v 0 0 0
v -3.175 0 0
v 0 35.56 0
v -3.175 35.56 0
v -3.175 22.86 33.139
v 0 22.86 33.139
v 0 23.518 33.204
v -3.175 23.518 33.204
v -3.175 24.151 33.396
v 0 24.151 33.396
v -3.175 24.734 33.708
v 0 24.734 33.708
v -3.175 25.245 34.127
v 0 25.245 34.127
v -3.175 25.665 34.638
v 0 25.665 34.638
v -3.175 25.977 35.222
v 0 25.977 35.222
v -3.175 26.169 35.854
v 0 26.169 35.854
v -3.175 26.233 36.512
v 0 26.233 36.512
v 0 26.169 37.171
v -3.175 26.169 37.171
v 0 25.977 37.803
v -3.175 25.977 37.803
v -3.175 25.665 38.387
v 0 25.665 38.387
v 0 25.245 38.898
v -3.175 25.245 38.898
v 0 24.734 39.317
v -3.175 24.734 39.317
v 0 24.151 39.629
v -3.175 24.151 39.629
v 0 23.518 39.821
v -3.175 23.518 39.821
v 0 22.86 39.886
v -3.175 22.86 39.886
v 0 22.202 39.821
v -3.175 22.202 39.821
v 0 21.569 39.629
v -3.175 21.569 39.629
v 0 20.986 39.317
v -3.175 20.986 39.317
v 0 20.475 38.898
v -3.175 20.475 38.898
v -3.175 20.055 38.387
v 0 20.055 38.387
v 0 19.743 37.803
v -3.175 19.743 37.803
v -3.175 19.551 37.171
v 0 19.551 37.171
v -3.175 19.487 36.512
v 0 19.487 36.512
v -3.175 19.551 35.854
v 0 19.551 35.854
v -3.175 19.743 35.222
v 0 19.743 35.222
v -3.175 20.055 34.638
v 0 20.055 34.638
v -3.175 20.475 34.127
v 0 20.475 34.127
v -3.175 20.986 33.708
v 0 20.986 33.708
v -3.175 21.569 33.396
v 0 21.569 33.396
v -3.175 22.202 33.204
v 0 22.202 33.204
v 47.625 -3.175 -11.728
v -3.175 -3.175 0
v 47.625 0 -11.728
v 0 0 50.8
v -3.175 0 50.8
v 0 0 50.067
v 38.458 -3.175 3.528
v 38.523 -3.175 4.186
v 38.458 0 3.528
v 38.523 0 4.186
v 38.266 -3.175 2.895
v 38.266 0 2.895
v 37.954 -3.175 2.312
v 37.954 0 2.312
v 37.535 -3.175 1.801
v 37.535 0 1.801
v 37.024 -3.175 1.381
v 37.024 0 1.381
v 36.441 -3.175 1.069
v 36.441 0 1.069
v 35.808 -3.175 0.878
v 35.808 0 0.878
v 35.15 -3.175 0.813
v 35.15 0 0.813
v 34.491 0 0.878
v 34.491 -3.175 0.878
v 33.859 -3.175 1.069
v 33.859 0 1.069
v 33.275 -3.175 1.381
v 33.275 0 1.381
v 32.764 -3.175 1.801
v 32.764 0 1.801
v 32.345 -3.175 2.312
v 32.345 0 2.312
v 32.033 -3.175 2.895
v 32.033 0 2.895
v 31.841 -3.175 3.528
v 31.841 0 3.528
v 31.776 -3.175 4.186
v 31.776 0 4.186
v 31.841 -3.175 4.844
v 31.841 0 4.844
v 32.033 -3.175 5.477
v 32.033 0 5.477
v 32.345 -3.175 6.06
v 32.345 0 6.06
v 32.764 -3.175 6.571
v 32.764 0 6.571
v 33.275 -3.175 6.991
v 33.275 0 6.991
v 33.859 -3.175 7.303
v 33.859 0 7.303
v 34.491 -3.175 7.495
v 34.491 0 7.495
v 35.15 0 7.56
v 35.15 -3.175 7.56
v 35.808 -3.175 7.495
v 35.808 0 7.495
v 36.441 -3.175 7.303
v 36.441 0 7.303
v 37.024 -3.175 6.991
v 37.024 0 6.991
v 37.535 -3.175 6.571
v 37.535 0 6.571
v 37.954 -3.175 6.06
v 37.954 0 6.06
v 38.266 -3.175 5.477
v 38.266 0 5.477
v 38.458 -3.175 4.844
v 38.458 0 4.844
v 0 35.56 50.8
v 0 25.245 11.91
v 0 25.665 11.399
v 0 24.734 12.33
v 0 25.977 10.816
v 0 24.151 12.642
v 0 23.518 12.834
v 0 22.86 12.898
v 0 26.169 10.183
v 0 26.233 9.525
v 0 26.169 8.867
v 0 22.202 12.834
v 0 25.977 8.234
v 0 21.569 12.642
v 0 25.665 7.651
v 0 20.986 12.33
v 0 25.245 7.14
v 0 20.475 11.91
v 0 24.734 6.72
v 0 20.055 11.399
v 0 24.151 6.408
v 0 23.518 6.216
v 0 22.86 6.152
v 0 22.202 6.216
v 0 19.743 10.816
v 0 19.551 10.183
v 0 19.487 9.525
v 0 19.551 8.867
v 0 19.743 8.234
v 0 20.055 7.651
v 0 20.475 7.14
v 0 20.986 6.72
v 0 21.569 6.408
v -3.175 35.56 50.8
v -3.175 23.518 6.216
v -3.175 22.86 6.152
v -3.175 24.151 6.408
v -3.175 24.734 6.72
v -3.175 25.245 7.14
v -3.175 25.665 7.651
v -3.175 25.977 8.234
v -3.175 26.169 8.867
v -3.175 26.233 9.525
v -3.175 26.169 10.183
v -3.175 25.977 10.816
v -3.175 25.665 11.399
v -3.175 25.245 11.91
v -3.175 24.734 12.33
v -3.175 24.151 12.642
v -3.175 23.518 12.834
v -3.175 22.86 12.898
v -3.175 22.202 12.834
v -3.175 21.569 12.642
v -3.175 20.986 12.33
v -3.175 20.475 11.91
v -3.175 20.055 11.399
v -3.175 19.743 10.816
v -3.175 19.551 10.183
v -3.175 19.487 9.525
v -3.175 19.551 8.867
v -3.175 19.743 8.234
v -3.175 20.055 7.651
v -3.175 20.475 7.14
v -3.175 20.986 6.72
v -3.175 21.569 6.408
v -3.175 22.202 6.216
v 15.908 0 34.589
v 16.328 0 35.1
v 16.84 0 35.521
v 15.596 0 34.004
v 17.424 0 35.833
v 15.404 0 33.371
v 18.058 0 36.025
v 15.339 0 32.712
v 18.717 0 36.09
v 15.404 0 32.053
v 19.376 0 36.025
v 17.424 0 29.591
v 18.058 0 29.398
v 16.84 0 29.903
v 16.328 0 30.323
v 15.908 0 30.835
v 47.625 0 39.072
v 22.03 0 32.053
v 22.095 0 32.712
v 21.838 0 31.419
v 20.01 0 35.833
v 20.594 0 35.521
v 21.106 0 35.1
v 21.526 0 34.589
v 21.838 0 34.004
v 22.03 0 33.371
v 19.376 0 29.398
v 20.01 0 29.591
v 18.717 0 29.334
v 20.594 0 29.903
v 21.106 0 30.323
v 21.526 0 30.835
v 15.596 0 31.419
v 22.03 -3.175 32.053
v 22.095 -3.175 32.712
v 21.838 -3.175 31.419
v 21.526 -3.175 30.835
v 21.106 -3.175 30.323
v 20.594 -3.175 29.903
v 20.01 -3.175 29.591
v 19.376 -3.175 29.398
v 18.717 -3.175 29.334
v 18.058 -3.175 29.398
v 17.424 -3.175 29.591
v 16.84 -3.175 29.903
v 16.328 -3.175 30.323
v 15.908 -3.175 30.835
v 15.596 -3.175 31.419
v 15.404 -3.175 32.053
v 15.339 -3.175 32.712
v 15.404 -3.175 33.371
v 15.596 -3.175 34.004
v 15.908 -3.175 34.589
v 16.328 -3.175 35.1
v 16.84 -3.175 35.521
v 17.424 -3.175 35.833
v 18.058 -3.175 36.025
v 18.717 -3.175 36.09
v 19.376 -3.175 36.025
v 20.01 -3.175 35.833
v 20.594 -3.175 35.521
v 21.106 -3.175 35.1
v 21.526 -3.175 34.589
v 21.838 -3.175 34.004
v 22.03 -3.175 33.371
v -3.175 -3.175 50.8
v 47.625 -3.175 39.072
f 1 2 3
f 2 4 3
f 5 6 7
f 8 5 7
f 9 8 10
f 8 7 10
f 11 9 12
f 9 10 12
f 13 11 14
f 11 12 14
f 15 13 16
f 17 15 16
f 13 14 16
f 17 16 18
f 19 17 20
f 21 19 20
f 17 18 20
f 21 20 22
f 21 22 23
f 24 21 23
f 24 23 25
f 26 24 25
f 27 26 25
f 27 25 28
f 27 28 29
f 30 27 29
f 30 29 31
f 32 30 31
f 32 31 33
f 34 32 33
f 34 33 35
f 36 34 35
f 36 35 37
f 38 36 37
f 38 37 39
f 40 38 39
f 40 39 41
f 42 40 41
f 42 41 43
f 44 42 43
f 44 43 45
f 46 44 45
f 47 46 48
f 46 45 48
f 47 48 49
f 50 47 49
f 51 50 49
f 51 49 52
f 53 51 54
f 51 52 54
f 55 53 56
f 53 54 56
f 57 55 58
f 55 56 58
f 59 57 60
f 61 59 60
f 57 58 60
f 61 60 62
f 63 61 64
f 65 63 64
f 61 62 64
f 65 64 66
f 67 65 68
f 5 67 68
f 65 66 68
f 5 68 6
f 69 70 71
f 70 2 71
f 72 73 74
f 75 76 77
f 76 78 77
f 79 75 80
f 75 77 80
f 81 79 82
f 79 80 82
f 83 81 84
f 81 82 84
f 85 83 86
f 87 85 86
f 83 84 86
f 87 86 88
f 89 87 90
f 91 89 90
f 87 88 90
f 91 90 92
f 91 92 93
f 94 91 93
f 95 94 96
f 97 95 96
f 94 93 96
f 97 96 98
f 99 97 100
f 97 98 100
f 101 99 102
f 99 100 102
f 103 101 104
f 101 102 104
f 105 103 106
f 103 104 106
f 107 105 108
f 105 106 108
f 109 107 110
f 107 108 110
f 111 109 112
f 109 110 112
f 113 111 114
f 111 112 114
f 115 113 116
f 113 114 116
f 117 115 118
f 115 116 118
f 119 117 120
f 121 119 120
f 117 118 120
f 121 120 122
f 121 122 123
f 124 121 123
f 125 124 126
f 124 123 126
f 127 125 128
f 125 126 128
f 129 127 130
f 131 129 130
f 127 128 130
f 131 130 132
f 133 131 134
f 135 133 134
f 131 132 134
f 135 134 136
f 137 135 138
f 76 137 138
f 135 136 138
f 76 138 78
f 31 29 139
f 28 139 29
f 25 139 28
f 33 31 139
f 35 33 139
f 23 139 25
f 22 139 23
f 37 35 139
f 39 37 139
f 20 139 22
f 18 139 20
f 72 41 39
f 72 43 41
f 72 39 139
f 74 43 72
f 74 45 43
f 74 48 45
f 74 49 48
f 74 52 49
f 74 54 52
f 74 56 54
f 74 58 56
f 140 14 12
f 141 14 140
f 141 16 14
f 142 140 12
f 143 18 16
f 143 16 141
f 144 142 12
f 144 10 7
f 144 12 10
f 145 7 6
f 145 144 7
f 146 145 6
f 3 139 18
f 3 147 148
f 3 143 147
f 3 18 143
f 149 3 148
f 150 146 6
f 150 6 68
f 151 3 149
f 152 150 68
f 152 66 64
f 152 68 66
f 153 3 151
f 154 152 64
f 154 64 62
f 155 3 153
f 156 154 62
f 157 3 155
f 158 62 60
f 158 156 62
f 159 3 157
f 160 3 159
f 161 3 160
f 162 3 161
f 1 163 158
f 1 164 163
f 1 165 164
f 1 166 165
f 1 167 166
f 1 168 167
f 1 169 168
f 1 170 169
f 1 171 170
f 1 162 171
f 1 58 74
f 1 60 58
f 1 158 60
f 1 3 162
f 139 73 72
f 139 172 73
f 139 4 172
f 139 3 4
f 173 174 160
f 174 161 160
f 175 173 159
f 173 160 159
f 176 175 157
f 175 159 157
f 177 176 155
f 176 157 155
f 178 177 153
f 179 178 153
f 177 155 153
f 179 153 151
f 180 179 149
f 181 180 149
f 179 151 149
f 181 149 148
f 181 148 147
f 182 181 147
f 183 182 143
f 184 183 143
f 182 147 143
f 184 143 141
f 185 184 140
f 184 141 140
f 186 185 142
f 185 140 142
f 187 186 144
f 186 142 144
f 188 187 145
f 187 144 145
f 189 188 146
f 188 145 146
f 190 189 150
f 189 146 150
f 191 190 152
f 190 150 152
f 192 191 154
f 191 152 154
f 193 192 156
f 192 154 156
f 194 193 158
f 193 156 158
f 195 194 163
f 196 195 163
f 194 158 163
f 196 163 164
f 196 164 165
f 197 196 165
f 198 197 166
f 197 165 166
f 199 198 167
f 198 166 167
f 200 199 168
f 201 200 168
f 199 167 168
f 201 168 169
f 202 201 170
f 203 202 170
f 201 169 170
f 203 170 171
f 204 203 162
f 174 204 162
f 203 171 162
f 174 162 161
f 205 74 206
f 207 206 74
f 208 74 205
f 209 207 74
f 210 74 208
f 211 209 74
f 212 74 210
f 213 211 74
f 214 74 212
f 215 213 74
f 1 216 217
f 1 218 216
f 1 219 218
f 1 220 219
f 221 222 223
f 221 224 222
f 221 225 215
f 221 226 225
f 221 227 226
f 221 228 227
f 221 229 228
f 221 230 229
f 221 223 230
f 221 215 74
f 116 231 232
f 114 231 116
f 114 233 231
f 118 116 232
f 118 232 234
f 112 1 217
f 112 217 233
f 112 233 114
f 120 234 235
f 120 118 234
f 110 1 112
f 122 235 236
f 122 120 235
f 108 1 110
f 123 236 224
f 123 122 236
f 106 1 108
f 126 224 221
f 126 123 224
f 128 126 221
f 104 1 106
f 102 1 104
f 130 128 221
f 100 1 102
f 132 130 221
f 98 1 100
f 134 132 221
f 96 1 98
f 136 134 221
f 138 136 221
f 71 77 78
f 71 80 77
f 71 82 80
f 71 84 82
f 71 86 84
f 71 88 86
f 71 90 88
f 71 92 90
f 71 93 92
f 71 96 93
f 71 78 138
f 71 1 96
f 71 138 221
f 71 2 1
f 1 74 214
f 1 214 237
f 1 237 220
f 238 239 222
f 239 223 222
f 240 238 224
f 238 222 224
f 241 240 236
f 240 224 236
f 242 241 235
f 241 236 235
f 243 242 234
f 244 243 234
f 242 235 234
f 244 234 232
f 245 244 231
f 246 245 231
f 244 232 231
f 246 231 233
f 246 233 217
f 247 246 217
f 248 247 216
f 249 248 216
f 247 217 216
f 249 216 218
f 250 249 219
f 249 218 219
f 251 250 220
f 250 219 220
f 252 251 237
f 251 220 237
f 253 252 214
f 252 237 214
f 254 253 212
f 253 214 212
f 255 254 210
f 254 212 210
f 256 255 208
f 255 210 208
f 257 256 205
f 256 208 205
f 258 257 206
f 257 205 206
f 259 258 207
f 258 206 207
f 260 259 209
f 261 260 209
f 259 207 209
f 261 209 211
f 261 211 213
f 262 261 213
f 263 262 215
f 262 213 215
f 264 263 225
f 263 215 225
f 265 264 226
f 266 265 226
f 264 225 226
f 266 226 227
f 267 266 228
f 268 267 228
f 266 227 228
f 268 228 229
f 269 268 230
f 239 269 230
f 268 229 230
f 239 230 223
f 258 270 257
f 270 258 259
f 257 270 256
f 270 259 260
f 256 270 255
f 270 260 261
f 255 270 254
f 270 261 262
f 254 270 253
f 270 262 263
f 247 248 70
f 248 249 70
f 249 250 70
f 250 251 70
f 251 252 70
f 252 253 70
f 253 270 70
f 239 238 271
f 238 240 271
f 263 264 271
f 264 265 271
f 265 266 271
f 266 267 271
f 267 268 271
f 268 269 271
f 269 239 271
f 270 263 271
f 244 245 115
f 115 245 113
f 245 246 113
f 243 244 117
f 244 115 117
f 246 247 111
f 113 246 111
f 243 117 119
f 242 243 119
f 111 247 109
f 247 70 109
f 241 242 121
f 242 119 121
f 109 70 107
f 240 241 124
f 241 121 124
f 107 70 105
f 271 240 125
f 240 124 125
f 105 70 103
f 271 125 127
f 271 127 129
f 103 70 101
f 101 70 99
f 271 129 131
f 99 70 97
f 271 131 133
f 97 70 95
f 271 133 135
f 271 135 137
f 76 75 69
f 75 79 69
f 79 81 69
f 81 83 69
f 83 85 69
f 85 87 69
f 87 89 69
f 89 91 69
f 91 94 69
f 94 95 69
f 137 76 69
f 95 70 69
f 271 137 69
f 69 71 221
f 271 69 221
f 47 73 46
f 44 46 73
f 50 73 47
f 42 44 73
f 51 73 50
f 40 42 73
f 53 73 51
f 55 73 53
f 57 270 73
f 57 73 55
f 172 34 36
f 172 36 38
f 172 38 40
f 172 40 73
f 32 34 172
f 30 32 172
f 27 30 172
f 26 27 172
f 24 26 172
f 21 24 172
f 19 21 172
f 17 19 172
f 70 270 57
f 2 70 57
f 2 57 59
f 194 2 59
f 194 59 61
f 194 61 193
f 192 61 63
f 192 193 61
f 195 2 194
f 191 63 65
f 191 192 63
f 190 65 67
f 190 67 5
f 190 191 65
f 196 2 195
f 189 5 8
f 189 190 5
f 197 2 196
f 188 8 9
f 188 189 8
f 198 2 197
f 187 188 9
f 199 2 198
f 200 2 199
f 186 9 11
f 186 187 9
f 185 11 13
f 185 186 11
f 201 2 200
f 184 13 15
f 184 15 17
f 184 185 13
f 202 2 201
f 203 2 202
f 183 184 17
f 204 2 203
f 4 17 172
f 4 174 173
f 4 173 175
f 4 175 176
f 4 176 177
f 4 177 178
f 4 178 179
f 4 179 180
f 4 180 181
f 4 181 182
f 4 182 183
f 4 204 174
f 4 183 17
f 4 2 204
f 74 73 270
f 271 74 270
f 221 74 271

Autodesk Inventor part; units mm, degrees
ref_plane "YZ Plane" through (0, 0, 0) normal (1, 0, 0) x (0, 1, 0)
ref_plane "XZ Plane" through (0, 0, 0) normal (0, 1, 0) x (-1, 0, 0)
ref_plane "XY Plane" through (0, 0, 0) normal (0, 0, 1) x (1, 0, 0)
sketch "Sketch1" plane through (0, 0, 0) normal (0, 0, 1) x (1, 0, 0)
  line L0 (0, 0) -> (47.625, 0)
  line L1 (47.625, 0) -> (47.625, -3.175)
  line L2 (47.625, -3.175) -> (-3.175, -3.175)
  line L3 (-3.175, -3.175) -> (-3.175, 47.625)
  line L4 (-3.175, 47.625) -> (0, 47.625)
  line L5 (0, 47.625) -> (0, 0)
  dimension "d14" = 50.8
  dimension "d15" = 3.175
extrude "Extrusion1" add sketch "Sketch1" along normal blind 50.8
sketch "Sketch2" plane through (0, 0, 0) normal (1, 0, 0) x (0, 0, -1)
  circle A0 centre (-9.525, 22.86) radius 3.3734
  circle A1 centre (-36.5125, 22.86) radius 3.3734
  line L0 (0, 0) -> (-50.8, 0) projected
  line L1 (0, 47.625) -> (0, 0) projected
  line L2 (-50.8, 0) -> (-50.8, 47.625) projected
  dimension "d6" = 6.7469
  dimension "d7" = 6.7469
  dimension "d8" = 22.86
  dimension "d9" = 22.86
  dimension "d16" = 14.2875
  dimension "d17" = 41.275
extrude "Extrusion2" cut sketch "Sketch2" against normal blind 3.175
sketch "Sketch3" plane through (0, 0, 0) normal (0, 1, 0) x (1, 0, 0)
  line L0 (0, -50.8) -> (-3.175, -50.8) projected
  line L1 (-3.175, -50.8) -> (47.625, -39.0719)
  line L2 (47.625, -50.8) -> (0, -50.8) projected
  circle A0 centre (35.1496, -4.1861) radius 3.3734
  circle A1 centre (18.7171, -32.7117) radius 3.3782
  line L3 (-3.175, 0) -> (-3.175, -50.8) projected
  line L4 (-3.175, -50.8) -> (-14.6025, -1.302) construction
  line L5 (47.625, 0) -> (47.625, -50.8) projected
  line L6 (47.625, 0) -> (47.625, -50.8) projected
  line L7 (47.625, -39.0719) -> (47.625, -50.8)
  line L8 (47.625, -50.8) -> (-3.175, -50.8)
  line L9 (-3.175, 0) -> (0, 0) projected
  line L10 (-3.175, 0) -> (47.625, 11.7281)
  line L11 (47.625, 11.7281) -> (47.625, 0)
  line L12 (47.625, 0) -> (-3.175, 0)
  line L13 (0, 0) -> (0, -50.8) projected
  dimension "d18" = 13
  dimension "d19" = 6.7469
  dimension "d20" = 6.7564
  dimension "d21" = 12.7
  dimension "d22" = 50.8
  dimension "d23" = 25.4
  dimension "d24" = 21.8921
  dimension "d26" = 12.7
  dimension "d35" = 47.8282
  dimension "d36" = 12.4754
  dimension "d37" = 18.7171
extrude "Extrusion3" cut sketch "Sketch3" against normal blind 3.175 contours L13 L1 L5 L2 | L0 L1 L13 | A0 | A1
extrude "Extrusion4" add sketch "Sketch3" against normal blind 3.175 contours L10 L11 L12 L9
sketch "Sketch4" plane through (0, 0, 0) normal (1, 0, 0) x (0, 0, -1)
  line L0 (-50.8, 0) -> (-50.8, 47.625) projected
  line L1 (0, 47.625) -> (0, 0) projected
  line L2 (-50.8, 47.625) -> (0, 47.625)
  line L3 (0, 47.625) -> (0, 35.56)
  line L4 (0, 35.56) -> (-50.8, 35.56)
  line L5 (-50.8, 35.56) -> (-50.8, 47.625)
  dimension "d32" = 12.065
extrude "Extrusion5" cut sketch "Sketch4" against normal blind 3.175
properties part number "rail gusset" material "Aluminum 6061"
